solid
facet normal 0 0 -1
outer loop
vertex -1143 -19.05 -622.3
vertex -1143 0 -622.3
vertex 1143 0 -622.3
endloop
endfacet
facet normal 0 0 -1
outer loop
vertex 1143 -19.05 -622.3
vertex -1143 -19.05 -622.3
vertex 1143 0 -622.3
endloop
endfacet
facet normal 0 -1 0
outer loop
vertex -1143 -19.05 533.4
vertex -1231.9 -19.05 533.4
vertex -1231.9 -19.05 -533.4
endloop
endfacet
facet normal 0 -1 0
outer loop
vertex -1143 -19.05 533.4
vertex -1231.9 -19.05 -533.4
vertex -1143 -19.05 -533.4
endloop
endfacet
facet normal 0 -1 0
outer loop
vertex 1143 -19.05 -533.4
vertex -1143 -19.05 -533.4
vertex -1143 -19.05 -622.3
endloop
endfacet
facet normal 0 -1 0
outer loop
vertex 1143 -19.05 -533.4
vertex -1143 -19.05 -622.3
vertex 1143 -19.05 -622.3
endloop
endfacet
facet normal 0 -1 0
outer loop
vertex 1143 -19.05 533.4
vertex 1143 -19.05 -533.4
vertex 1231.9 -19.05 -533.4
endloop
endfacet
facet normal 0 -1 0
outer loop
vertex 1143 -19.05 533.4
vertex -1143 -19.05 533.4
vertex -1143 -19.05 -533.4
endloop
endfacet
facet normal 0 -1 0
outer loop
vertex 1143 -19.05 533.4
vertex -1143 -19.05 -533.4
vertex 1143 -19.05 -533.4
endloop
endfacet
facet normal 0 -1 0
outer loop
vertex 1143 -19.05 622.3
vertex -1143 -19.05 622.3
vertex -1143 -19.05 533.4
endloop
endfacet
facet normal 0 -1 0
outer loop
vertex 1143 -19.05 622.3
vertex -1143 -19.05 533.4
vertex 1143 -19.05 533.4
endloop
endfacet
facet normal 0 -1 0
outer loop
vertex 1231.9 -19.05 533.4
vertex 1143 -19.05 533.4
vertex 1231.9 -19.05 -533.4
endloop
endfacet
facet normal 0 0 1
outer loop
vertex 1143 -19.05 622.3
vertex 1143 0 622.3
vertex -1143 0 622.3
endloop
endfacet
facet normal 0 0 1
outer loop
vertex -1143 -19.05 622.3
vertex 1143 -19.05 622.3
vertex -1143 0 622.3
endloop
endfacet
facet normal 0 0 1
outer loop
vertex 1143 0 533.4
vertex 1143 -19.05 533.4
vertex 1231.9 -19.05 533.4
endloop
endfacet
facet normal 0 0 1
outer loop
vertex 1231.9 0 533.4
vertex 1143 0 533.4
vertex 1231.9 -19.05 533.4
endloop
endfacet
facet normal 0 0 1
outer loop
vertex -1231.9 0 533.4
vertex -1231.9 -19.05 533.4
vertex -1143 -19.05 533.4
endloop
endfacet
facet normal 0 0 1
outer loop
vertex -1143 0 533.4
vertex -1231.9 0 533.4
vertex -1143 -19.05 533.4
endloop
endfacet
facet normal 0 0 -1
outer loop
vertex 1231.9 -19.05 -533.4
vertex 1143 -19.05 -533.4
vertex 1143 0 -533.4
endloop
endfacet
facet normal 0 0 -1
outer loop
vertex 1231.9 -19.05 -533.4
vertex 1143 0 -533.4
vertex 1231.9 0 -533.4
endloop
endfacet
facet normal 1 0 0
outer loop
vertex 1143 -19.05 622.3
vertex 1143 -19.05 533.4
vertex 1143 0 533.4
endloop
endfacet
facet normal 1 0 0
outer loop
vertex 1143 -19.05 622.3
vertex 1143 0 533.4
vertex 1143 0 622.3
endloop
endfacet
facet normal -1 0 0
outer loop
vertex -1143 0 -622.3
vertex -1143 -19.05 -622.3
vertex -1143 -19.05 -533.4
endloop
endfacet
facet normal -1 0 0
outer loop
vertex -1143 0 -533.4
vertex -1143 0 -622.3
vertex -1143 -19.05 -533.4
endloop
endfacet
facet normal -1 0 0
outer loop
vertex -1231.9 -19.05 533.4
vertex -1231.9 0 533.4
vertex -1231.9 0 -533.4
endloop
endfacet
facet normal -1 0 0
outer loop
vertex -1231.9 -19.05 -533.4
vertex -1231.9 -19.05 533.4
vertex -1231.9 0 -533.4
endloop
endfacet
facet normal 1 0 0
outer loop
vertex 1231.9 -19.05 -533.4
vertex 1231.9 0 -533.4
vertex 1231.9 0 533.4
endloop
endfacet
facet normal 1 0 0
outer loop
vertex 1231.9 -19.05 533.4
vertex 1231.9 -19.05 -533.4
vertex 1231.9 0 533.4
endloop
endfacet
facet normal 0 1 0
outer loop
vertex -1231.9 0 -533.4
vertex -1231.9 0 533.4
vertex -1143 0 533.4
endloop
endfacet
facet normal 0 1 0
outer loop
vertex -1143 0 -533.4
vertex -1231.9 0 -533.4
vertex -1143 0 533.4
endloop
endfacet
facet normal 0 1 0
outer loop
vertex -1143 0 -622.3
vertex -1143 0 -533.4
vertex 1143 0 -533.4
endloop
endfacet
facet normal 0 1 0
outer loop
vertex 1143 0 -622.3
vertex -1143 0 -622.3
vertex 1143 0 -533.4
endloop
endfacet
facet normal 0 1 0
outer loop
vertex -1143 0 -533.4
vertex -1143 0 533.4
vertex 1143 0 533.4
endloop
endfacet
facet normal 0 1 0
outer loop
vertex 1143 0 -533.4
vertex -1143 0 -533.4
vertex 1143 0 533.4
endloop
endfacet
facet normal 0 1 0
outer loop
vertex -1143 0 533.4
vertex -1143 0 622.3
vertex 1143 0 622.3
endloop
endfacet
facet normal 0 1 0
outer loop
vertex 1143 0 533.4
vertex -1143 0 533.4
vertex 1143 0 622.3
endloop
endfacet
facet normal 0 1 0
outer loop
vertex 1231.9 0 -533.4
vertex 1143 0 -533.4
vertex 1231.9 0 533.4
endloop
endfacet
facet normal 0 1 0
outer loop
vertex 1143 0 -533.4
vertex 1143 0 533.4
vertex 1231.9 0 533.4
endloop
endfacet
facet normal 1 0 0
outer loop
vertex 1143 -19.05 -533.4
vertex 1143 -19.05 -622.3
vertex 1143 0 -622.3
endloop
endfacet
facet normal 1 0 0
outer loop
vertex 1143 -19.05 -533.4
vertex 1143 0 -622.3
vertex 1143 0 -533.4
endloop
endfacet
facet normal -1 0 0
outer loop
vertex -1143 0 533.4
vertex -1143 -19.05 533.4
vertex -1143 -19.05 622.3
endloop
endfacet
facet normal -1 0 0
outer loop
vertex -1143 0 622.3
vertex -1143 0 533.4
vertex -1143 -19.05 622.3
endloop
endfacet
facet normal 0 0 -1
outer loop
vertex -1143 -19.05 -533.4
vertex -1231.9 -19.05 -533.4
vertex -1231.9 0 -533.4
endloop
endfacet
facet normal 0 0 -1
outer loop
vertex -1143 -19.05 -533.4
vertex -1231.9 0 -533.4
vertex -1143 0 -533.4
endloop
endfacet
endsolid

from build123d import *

# Parameters (mm, degrees)
F1_DEPTH = 19.05
F2_W     = 88.9
F2_H     = 88.9
F3_DEPTH = 25.4


with BuildPart() as f1:
    # F0 (on Front) → F1 (new body)
    with BuildSketch(Plane.XZ):
        Polygon((1231.9, 622.3), (0, 622.3), (-1231.9, 622.3), (-1231.9, 0), (-1231.9, -622.3), (0, -622.3), (1231.9, -622.3), (1231.9, 0), align=None)
    extrude(amount=F1_DEPTH)

    # F2 (on face) → F3 (cut)
    with BuildSketch(Plane.XZ.offset(19.05)):
        with Locations((-1187.45, 577.85)):
            Rectangle(F2_W, F2_H)
        with Locations((1187.45, 577.85)):
            Rectangle(F2_W, F2_H)
        with Locations((1187.45, -577.85)):
            Rectangle(F2_W, F2_H)
        with Locations((-1187.45, -577.85)):
            Rectangle(F2_W, F2_H)
    extrude(amount=-F3_DEPTH, mode=Mode.SUBTRACT)


solid = f1.part
